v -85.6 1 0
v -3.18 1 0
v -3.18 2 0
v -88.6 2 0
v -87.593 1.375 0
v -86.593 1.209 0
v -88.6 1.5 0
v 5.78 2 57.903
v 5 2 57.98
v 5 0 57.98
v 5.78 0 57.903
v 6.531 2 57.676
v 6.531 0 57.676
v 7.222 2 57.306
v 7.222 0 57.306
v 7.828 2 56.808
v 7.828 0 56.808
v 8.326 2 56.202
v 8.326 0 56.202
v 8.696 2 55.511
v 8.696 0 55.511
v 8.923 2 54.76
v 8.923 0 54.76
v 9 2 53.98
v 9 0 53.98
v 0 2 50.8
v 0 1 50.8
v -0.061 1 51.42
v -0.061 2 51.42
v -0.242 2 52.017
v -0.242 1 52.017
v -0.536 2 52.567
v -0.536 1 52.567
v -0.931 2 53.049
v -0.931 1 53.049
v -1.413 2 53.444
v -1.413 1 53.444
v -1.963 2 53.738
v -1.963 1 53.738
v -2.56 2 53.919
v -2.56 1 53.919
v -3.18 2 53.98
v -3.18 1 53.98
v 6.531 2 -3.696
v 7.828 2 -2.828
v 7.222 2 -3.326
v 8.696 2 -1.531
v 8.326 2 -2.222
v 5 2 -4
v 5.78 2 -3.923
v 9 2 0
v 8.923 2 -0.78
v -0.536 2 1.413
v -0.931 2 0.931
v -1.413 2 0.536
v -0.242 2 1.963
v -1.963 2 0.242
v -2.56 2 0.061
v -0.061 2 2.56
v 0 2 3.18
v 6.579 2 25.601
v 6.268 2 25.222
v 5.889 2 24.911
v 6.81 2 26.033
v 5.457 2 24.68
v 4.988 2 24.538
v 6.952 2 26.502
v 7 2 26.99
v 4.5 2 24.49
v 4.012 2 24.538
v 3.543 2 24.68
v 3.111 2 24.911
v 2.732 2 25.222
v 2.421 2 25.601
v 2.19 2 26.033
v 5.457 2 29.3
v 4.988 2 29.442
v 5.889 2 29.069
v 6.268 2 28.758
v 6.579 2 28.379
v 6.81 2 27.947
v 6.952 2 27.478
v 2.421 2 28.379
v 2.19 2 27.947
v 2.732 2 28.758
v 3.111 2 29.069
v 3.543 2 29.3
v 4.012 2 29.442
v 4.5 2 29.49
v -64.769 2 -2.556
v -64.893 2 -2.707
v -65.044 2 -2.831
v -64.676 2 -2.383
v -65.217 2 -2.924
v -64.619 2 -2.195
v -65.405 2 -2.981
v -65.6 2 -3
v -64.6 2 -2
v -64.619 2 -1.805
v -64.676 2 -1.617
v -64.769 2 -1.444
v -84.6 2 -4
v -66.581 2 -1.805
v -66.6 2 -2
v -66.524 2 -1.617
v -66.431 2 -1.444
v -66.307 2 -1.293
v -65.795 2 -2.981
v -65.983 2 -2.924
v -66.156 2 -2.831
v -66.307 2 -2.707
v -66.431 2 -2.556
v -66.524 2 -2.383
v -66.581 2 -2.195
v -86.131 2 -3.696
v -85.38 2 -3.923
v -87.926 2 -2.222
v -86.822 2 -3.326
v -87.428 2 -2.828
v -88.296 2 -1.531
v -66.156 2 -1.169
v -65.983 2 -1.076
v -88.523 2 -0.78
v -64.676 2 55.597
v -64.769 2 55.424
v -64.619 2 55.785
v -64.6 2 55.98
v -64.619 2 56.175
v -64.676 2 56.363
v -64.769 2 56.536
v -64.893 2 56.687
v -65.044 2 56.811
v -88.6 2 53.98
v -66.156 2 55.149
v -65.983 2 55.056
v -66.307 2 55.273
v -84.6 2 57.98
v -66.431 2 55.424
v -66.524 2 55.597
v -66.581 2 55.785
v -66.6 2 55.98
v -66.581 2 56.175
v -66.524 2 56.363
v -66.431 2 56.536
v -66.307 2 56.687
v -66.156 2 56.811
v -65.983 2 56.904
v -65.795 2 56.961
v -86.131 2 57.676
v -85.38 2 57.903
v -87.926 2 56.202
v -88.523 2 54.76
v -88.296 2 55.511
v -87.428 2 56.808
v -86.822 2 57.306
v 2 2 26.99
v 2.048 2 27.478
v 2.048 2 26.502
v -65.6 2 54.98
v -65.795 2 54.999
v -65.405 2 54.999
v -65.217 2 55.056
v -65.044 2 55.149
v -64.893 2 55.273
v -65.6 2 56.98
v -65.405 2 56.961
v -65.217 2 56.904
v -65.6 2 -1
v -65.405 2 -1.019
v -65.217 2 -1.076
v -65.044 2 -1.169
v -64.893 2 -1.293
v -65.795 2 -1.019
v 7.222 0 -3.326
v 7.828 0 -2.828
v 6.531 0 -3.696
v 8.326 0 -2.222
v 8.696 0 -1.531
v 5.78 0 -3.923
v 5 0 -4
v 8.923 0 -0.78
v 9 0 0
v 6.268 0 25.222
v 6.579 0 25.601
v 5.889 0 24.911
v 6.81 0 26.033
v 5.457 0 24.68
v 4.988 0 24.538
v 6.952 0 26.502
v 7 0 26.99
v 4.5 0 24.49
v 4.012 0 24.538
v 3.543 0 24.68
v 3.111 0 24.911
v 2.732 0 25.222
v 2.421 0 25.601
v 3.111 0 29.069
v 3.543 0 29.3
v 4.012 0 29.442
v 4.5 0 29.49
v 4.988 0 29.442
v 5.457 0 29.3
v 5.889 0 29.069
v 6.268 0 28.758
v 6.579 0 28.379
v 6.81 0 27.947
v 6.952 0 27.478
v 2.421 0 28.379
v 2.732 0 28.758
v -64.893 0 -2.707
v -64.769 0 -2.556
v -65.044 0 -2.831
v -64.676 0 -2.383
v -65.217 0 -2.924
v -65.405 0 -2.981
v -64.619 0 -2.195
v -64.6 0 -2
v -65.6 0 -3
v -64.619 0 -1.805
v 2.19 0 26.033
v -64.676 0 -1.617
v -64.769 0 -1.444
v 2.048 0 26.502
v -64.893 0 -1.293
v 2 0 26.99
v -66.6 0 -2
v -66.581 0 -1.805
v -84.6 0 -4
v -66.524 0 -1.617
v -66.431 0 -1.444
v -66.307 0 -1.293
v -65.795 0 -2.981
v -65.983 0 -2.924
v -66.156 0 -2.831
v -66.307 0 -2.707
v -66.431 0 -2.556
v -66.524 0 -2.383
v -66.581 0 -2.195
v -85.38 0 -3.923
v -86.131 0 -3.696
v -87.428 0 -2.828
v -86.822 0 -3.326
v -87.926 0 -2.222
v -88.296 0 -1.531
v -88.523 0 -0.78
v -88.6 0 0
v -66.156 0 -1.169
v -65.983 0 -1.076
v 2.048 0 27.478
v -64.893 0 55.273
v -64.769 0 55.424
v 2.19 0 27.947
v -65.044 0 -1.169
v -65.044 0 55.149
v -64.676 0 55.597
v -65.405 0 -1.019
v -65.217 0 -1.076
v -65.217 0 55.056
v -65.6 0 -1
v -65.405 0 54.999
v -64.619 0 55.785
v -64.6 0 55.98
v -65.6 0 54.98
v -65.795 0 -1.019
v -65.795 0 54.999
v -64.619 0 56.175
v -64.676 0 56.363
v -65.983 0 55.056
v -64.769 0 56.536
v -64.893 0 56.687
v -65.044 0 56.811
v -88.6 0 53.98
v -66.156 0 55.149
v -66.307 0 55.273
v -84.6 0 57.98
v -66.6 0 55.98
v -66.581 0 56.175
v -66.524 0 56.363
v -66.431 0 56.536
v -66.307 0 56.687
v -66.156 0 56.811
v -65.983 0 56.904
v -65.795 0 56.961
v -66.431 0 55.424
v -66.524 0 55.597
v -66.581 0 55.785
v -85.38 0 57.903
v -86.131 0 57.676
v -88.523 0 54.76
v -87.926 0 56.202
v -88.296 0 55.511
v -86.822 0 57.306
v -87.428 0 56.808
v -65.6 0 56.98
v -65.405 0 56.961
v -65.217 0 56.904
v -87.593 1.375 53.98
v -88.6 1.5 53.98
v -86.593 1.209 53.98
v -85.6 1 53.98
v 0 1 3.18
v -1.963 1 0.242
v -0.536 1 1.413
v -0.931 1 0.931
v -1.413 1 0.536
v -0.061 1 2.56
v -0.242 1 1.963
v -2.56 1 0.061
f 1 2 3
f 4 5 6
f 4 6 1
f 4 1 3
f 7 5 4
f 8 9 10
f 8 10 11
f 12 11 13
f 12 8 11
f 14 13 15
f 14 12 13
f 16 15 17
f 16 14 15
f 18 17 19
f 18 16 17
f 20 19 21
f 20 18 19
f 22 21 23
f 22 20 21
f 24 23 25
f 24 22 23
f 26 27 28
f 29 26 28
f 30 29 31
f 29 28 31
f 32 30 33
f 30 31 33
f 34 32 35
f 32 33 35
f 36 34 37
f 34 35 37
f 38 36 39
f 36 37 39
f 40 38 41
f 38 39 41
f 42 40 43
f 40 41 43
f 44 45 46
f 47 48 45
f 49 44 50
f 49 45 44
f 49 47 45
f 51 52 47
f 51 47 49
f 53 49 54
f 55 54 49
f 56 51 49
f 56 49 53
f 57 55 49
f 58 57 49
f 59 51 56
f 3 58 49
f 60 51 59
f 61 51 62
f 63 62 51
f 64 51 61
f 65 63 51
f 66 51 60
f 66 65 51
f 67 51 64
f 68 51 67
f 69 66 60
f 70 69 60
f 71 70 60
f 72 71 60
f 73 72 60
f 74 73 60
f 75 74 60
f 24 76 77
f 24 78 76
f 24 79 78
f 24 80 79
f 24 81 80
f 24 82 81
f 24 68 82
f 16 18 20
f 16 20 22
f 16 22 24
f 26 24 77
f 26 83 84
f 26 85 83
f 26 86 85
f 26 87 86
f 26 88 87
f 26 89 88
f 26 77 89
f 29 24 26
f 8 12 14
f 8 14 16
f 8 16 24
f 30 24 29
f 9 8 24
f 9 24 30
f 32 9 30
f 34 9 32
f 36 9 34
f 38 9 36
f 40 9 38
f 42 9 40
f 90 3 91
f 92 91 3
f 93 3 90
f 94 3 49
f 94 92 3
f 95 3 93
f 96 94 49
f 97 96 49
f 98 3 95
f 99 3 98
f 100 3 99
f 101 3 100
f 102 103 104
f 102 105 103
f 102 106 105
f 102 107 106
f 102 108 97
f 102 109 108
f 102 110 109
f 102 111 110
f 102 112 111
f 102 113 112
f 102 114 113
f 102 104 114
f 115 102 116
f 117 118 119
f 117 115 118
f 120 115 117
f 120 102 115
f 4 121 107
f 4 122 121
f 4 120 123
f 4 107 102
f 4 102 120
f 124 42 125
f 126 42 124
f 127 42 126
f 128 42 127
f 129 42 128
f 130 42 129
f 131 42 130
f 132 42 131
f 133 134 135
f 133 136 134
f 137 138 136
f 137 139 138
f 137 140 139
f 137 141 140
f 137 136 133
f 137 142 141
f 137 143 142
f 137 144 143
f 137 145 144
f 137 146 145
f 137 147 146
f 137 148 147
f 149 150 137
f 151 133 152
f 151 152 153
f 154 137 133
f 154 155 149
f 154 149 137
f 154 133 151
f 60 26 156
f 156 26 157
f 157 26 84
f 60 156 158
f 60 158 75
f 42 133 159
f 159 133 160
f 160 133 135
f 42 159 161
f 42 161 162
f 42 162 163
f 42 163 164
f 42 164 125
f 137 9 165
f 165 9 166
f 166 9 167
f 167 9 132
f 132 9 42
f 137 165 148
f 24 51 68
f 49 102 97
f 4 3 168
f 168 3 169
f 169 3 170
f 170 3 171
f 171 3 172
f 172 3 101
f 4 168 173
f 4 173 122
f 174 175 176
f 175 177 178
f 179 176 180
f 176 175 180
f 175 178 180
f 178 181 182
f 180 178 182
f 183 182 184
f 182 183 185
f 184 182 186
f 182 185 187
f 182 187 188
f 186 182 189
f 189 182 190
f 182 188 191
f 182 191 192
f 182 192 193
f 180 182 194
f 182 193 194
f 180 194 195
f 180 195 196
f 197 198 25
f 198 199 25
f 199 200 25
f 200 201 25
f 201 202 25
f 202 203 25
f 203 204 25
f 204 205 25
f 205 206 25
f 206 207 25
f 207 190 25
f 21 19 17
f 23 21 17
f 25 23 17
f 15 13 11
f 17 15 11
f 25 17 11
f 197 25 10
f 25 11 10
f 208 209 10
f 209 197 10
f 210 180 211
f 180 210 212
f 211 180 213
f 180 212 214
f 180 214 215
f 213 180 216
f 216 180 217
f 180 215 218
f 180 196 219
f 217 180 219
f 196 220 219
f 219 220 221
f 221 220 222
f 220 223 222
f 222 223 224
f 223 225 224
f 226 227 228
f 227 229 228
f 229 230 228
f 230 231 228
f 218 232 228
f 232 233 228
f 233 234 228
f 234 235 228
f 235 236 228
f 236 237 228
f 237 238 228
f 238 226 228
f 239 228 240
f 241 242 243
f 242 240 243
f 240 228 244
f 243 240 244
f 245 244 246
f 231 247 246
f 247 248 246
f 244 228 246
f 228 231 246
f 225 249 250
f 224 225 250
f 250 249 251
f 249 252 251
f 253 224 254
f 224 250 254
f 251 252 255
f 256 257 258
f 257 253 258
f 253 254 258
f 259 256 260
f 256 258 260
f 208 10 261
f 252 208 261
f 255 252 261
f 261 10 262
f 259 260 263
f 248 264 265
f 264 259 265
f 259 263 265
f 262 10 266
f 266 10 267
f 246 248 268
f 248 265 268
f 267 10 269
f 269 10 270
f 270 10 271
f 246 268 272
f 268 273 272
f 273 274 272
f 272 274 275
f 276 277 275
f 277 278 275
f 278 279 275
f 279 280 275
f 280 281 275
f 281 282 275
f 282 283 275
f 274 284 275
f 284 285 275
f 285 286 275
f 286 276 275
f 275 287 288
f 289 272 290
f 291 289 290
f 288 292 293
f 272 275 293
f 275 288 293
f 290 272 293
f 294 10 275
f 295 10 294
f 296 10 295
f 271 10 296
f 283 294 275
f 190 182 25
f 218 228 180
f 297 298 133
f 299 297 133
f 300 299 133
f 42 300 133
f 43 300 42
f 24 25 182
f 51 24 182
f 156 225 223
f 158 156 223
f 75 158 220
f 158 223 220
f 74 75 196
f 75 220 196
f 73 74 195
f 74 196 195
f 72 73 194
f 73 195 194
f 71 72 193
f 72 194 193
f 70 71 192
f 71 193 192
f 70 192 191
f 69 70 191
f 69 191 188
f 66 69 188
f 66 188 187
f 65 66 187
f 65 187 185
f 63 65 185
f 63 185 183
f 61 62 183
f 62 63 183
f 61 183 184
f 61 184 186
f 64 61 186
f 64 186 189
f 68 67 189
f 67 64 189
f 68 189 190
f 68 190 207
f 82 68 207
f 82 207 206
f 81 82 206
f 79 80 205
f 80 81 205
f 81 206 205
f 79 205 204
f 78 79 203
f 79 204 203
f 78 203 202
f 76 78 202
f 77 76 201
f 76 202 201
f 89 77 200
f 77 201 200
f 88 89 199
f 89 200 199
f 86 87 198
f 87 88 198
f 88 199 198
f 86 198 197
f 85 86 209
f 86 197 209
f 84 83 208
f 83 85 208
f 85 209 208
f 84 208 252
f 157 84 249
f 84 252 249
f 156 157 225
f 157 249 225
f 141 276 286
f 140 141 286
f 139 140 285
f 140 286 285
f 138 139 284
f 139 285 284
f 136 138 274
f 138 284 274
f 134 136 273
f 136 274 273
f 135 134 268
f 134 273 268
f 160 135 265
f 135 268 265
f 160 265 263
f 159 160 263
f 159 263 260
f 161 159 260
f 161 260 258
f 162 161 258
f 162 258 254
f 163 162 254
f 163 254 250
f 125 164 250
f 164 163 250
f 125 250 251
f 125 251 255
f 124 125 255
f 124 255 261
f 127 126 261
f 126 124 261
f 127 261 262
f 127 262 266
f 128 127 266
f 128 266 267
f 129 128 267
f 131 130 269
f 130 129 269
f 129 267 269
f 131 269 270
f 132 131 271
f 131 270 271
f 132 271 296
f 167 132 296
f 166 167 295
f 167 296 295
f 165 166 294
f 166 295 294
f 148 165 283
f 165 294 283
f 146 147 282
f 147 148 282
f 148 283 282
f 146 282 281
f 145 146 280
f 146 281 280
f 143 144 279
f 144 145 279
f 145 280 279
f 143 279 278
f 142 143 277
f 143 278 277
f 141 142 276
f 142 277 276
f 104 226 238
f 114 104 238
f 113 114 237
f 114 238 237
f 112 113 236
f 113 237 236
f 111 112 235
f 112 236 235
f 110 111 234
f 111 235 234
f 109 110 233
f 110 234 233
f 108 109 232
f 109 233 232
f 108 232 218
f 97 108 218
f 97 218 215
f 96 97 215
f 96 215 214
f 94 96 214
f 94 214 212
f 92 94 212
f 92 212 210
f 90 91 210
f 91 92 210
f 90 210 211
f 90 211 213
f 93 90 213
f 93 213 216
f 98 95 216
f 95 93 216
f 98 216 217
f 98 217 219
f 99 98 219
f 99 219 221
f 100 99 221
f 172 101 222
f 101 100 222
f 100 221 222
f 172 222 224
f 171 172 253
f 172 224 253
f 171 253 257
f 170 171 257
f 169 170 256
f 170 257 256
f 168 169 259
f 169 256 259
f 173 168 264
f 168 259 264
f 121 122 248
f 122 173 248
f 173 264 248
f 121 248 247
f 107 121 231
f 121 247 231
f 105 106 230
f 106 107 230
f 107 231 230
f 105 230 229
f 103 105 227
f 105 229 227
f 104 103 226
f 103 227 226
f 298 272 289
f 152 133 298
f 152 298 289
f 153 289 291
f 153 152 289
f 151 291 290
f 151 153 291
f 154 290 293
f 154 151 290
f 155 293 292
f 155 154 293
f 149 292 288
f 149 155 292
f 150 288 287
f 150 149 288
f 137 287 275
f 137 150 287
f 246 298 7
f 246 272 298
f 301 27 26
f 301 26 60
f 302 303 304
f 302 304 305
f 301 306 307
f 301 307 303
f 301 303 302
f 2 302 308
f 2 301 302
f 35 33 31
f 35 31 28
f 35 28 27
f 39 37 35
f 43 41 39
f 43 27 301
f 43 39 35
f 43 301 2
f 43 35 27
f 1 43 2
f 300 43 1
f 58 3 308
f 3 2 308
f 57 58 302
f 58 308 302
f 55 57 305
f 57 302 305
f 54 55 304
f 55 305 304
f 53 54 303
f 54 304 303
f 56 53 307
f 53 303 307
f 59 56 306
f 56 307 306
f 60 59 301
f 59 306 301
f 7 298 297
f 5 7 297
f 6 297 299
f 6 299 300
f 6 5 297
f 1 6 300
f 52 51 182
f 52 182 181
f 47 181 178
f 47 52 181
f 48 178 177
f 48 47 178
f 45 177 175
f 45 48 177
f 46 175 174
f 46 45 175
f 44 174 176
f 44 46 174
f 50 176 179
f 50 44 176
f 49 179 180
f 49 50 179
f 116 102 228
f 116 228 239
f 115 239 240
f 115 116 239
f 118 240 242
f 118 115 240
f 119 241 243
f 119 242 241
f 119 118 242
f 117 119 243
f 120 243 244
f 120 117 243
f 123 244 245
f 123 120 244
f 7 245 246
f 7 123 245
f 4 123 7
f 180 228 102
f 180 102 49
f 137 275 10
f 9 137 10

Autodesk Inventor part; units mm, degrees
ref_plane "YZ Plane" through (0, 0, 0) normal (1, 0, 0) x (0, 1, 0)
ref_plane "XZ Plane" through (0, 0, 0) normal (0, 1, 0) x (-1, 0, 0)
ref_plane "XY Plane" through (0, 0, 0) normal (0, 0, 1) x (1, 0, 0)
sketch "Sketch1" plane through (0, 0, 0) normal (0, 1, 0) x (-1, 0, 0)
  line L0 (0, 0) -> (85.6, 0)
  line L1 (85.6, 0) -> (85.6, 53.98)
  line L2 (85.6, 53.98) -> (0, 53.98)
  line L3 (0, 53.98) -> (0, 0)
  line L4 (0, 53.98) -> (0, 50.8)
  line L5 (0, 50.8) -> (3.18, 50.8)
  circle A0 centre (3.18, 50.8) radius 3.18
  line L6 (85.6, 53.98) -> (85.6, 57.98)
  line L7 (85.6, 57.98) -> (0, 57.98)
  line L8 (0, 57.98) -> (-9, 57.98)
  line L9 (-9, 57.98) -> (-9, 0)
  line L10 (-9, 0) -> (0, 0)
  line L11 (0, 26.99) -> (-4.5, 26.99)
  circle A1 centre (-4.5, 26.99) radius 2.5
  line L12 (85.6, 55.98) -> (65.6, 55.98)
  circle A2 centre (65.6, 55.98) radius 1
  line L13 (0, 26.99) -> (85.6, 26.99)
  line L14 (85.6, -4) -> (0, -4)
  line L15 (0, -4) -> (-9, -4)
  circle A3 centre (65.6, -2) radius 1
  line L16 (85.6, -4) -> (85.6, 0)
  line L17 (-9, -4) -> (-9, 0)
  line L18 (85.6, 57.98) -> (88.6, 57.98)
  line L19 (88.6, 57.98) -> (88.6, -4)
  line L20 (88.6, -4) -> (85.6, -4)
  line L21 (85.6, -4) -> (85.6, 57.98)
  line L22 (85.6, 53.98) -> (88.6, 53.98)
  line L23 (85.6, 0) -> (88.6, 0)
  circle A4 centre (3.18, 3.18) radius 3.18
  point P0 (3.18, 0)
  point P1 (0, 3.18)
  point P2 (3.18, 53.98)
  dimension "d0" = 85.6
  dimension "d1" = 53.98
  dimension "d2" = 3.18
  dimension "d3" = 3.18
  dimension "d4" = 4
  dimension "d5" = 9
  dimension "d6" = 5
  dimension "d7" = 20
  dimension "d8" = 2
  dimension "d9" = 3
extrude "Extrusion1" add sketch "Sketch1" along normal blind 2 contours L3 A4 L0 | L10 L9 L8 L7 L6 L2 L3 | L0 L16 L14 L15 L17 L10 | L3 L2 A0 | L6 L18 L19 L22
extrude "Extrusion2" add sketch "Sketch1" along normal blind 1 contours A4 L3 L13 L1 L0 | A4 | L3 A0 L2 L1 L13 | A0
extrude "Extrusion3" add sketch "Sketch1" along normal blind 2 contours L23 L19 L20 L16
extrude "Extrusion4" add sketch "Sketch1" along normal blind 1.5 contours L1 L22 L19 L23
fillet "Fillet1" radius 24.13 1 edges at (-85.6, 1.5, 26.99)
fillet "Fillet2" radius 4 4 edges at (-88.6, 1, 57.98) (-88.6, 1, -4) (9, 1, -4) (9, 1, 57.98)
properties part number "magnet card bottom"
